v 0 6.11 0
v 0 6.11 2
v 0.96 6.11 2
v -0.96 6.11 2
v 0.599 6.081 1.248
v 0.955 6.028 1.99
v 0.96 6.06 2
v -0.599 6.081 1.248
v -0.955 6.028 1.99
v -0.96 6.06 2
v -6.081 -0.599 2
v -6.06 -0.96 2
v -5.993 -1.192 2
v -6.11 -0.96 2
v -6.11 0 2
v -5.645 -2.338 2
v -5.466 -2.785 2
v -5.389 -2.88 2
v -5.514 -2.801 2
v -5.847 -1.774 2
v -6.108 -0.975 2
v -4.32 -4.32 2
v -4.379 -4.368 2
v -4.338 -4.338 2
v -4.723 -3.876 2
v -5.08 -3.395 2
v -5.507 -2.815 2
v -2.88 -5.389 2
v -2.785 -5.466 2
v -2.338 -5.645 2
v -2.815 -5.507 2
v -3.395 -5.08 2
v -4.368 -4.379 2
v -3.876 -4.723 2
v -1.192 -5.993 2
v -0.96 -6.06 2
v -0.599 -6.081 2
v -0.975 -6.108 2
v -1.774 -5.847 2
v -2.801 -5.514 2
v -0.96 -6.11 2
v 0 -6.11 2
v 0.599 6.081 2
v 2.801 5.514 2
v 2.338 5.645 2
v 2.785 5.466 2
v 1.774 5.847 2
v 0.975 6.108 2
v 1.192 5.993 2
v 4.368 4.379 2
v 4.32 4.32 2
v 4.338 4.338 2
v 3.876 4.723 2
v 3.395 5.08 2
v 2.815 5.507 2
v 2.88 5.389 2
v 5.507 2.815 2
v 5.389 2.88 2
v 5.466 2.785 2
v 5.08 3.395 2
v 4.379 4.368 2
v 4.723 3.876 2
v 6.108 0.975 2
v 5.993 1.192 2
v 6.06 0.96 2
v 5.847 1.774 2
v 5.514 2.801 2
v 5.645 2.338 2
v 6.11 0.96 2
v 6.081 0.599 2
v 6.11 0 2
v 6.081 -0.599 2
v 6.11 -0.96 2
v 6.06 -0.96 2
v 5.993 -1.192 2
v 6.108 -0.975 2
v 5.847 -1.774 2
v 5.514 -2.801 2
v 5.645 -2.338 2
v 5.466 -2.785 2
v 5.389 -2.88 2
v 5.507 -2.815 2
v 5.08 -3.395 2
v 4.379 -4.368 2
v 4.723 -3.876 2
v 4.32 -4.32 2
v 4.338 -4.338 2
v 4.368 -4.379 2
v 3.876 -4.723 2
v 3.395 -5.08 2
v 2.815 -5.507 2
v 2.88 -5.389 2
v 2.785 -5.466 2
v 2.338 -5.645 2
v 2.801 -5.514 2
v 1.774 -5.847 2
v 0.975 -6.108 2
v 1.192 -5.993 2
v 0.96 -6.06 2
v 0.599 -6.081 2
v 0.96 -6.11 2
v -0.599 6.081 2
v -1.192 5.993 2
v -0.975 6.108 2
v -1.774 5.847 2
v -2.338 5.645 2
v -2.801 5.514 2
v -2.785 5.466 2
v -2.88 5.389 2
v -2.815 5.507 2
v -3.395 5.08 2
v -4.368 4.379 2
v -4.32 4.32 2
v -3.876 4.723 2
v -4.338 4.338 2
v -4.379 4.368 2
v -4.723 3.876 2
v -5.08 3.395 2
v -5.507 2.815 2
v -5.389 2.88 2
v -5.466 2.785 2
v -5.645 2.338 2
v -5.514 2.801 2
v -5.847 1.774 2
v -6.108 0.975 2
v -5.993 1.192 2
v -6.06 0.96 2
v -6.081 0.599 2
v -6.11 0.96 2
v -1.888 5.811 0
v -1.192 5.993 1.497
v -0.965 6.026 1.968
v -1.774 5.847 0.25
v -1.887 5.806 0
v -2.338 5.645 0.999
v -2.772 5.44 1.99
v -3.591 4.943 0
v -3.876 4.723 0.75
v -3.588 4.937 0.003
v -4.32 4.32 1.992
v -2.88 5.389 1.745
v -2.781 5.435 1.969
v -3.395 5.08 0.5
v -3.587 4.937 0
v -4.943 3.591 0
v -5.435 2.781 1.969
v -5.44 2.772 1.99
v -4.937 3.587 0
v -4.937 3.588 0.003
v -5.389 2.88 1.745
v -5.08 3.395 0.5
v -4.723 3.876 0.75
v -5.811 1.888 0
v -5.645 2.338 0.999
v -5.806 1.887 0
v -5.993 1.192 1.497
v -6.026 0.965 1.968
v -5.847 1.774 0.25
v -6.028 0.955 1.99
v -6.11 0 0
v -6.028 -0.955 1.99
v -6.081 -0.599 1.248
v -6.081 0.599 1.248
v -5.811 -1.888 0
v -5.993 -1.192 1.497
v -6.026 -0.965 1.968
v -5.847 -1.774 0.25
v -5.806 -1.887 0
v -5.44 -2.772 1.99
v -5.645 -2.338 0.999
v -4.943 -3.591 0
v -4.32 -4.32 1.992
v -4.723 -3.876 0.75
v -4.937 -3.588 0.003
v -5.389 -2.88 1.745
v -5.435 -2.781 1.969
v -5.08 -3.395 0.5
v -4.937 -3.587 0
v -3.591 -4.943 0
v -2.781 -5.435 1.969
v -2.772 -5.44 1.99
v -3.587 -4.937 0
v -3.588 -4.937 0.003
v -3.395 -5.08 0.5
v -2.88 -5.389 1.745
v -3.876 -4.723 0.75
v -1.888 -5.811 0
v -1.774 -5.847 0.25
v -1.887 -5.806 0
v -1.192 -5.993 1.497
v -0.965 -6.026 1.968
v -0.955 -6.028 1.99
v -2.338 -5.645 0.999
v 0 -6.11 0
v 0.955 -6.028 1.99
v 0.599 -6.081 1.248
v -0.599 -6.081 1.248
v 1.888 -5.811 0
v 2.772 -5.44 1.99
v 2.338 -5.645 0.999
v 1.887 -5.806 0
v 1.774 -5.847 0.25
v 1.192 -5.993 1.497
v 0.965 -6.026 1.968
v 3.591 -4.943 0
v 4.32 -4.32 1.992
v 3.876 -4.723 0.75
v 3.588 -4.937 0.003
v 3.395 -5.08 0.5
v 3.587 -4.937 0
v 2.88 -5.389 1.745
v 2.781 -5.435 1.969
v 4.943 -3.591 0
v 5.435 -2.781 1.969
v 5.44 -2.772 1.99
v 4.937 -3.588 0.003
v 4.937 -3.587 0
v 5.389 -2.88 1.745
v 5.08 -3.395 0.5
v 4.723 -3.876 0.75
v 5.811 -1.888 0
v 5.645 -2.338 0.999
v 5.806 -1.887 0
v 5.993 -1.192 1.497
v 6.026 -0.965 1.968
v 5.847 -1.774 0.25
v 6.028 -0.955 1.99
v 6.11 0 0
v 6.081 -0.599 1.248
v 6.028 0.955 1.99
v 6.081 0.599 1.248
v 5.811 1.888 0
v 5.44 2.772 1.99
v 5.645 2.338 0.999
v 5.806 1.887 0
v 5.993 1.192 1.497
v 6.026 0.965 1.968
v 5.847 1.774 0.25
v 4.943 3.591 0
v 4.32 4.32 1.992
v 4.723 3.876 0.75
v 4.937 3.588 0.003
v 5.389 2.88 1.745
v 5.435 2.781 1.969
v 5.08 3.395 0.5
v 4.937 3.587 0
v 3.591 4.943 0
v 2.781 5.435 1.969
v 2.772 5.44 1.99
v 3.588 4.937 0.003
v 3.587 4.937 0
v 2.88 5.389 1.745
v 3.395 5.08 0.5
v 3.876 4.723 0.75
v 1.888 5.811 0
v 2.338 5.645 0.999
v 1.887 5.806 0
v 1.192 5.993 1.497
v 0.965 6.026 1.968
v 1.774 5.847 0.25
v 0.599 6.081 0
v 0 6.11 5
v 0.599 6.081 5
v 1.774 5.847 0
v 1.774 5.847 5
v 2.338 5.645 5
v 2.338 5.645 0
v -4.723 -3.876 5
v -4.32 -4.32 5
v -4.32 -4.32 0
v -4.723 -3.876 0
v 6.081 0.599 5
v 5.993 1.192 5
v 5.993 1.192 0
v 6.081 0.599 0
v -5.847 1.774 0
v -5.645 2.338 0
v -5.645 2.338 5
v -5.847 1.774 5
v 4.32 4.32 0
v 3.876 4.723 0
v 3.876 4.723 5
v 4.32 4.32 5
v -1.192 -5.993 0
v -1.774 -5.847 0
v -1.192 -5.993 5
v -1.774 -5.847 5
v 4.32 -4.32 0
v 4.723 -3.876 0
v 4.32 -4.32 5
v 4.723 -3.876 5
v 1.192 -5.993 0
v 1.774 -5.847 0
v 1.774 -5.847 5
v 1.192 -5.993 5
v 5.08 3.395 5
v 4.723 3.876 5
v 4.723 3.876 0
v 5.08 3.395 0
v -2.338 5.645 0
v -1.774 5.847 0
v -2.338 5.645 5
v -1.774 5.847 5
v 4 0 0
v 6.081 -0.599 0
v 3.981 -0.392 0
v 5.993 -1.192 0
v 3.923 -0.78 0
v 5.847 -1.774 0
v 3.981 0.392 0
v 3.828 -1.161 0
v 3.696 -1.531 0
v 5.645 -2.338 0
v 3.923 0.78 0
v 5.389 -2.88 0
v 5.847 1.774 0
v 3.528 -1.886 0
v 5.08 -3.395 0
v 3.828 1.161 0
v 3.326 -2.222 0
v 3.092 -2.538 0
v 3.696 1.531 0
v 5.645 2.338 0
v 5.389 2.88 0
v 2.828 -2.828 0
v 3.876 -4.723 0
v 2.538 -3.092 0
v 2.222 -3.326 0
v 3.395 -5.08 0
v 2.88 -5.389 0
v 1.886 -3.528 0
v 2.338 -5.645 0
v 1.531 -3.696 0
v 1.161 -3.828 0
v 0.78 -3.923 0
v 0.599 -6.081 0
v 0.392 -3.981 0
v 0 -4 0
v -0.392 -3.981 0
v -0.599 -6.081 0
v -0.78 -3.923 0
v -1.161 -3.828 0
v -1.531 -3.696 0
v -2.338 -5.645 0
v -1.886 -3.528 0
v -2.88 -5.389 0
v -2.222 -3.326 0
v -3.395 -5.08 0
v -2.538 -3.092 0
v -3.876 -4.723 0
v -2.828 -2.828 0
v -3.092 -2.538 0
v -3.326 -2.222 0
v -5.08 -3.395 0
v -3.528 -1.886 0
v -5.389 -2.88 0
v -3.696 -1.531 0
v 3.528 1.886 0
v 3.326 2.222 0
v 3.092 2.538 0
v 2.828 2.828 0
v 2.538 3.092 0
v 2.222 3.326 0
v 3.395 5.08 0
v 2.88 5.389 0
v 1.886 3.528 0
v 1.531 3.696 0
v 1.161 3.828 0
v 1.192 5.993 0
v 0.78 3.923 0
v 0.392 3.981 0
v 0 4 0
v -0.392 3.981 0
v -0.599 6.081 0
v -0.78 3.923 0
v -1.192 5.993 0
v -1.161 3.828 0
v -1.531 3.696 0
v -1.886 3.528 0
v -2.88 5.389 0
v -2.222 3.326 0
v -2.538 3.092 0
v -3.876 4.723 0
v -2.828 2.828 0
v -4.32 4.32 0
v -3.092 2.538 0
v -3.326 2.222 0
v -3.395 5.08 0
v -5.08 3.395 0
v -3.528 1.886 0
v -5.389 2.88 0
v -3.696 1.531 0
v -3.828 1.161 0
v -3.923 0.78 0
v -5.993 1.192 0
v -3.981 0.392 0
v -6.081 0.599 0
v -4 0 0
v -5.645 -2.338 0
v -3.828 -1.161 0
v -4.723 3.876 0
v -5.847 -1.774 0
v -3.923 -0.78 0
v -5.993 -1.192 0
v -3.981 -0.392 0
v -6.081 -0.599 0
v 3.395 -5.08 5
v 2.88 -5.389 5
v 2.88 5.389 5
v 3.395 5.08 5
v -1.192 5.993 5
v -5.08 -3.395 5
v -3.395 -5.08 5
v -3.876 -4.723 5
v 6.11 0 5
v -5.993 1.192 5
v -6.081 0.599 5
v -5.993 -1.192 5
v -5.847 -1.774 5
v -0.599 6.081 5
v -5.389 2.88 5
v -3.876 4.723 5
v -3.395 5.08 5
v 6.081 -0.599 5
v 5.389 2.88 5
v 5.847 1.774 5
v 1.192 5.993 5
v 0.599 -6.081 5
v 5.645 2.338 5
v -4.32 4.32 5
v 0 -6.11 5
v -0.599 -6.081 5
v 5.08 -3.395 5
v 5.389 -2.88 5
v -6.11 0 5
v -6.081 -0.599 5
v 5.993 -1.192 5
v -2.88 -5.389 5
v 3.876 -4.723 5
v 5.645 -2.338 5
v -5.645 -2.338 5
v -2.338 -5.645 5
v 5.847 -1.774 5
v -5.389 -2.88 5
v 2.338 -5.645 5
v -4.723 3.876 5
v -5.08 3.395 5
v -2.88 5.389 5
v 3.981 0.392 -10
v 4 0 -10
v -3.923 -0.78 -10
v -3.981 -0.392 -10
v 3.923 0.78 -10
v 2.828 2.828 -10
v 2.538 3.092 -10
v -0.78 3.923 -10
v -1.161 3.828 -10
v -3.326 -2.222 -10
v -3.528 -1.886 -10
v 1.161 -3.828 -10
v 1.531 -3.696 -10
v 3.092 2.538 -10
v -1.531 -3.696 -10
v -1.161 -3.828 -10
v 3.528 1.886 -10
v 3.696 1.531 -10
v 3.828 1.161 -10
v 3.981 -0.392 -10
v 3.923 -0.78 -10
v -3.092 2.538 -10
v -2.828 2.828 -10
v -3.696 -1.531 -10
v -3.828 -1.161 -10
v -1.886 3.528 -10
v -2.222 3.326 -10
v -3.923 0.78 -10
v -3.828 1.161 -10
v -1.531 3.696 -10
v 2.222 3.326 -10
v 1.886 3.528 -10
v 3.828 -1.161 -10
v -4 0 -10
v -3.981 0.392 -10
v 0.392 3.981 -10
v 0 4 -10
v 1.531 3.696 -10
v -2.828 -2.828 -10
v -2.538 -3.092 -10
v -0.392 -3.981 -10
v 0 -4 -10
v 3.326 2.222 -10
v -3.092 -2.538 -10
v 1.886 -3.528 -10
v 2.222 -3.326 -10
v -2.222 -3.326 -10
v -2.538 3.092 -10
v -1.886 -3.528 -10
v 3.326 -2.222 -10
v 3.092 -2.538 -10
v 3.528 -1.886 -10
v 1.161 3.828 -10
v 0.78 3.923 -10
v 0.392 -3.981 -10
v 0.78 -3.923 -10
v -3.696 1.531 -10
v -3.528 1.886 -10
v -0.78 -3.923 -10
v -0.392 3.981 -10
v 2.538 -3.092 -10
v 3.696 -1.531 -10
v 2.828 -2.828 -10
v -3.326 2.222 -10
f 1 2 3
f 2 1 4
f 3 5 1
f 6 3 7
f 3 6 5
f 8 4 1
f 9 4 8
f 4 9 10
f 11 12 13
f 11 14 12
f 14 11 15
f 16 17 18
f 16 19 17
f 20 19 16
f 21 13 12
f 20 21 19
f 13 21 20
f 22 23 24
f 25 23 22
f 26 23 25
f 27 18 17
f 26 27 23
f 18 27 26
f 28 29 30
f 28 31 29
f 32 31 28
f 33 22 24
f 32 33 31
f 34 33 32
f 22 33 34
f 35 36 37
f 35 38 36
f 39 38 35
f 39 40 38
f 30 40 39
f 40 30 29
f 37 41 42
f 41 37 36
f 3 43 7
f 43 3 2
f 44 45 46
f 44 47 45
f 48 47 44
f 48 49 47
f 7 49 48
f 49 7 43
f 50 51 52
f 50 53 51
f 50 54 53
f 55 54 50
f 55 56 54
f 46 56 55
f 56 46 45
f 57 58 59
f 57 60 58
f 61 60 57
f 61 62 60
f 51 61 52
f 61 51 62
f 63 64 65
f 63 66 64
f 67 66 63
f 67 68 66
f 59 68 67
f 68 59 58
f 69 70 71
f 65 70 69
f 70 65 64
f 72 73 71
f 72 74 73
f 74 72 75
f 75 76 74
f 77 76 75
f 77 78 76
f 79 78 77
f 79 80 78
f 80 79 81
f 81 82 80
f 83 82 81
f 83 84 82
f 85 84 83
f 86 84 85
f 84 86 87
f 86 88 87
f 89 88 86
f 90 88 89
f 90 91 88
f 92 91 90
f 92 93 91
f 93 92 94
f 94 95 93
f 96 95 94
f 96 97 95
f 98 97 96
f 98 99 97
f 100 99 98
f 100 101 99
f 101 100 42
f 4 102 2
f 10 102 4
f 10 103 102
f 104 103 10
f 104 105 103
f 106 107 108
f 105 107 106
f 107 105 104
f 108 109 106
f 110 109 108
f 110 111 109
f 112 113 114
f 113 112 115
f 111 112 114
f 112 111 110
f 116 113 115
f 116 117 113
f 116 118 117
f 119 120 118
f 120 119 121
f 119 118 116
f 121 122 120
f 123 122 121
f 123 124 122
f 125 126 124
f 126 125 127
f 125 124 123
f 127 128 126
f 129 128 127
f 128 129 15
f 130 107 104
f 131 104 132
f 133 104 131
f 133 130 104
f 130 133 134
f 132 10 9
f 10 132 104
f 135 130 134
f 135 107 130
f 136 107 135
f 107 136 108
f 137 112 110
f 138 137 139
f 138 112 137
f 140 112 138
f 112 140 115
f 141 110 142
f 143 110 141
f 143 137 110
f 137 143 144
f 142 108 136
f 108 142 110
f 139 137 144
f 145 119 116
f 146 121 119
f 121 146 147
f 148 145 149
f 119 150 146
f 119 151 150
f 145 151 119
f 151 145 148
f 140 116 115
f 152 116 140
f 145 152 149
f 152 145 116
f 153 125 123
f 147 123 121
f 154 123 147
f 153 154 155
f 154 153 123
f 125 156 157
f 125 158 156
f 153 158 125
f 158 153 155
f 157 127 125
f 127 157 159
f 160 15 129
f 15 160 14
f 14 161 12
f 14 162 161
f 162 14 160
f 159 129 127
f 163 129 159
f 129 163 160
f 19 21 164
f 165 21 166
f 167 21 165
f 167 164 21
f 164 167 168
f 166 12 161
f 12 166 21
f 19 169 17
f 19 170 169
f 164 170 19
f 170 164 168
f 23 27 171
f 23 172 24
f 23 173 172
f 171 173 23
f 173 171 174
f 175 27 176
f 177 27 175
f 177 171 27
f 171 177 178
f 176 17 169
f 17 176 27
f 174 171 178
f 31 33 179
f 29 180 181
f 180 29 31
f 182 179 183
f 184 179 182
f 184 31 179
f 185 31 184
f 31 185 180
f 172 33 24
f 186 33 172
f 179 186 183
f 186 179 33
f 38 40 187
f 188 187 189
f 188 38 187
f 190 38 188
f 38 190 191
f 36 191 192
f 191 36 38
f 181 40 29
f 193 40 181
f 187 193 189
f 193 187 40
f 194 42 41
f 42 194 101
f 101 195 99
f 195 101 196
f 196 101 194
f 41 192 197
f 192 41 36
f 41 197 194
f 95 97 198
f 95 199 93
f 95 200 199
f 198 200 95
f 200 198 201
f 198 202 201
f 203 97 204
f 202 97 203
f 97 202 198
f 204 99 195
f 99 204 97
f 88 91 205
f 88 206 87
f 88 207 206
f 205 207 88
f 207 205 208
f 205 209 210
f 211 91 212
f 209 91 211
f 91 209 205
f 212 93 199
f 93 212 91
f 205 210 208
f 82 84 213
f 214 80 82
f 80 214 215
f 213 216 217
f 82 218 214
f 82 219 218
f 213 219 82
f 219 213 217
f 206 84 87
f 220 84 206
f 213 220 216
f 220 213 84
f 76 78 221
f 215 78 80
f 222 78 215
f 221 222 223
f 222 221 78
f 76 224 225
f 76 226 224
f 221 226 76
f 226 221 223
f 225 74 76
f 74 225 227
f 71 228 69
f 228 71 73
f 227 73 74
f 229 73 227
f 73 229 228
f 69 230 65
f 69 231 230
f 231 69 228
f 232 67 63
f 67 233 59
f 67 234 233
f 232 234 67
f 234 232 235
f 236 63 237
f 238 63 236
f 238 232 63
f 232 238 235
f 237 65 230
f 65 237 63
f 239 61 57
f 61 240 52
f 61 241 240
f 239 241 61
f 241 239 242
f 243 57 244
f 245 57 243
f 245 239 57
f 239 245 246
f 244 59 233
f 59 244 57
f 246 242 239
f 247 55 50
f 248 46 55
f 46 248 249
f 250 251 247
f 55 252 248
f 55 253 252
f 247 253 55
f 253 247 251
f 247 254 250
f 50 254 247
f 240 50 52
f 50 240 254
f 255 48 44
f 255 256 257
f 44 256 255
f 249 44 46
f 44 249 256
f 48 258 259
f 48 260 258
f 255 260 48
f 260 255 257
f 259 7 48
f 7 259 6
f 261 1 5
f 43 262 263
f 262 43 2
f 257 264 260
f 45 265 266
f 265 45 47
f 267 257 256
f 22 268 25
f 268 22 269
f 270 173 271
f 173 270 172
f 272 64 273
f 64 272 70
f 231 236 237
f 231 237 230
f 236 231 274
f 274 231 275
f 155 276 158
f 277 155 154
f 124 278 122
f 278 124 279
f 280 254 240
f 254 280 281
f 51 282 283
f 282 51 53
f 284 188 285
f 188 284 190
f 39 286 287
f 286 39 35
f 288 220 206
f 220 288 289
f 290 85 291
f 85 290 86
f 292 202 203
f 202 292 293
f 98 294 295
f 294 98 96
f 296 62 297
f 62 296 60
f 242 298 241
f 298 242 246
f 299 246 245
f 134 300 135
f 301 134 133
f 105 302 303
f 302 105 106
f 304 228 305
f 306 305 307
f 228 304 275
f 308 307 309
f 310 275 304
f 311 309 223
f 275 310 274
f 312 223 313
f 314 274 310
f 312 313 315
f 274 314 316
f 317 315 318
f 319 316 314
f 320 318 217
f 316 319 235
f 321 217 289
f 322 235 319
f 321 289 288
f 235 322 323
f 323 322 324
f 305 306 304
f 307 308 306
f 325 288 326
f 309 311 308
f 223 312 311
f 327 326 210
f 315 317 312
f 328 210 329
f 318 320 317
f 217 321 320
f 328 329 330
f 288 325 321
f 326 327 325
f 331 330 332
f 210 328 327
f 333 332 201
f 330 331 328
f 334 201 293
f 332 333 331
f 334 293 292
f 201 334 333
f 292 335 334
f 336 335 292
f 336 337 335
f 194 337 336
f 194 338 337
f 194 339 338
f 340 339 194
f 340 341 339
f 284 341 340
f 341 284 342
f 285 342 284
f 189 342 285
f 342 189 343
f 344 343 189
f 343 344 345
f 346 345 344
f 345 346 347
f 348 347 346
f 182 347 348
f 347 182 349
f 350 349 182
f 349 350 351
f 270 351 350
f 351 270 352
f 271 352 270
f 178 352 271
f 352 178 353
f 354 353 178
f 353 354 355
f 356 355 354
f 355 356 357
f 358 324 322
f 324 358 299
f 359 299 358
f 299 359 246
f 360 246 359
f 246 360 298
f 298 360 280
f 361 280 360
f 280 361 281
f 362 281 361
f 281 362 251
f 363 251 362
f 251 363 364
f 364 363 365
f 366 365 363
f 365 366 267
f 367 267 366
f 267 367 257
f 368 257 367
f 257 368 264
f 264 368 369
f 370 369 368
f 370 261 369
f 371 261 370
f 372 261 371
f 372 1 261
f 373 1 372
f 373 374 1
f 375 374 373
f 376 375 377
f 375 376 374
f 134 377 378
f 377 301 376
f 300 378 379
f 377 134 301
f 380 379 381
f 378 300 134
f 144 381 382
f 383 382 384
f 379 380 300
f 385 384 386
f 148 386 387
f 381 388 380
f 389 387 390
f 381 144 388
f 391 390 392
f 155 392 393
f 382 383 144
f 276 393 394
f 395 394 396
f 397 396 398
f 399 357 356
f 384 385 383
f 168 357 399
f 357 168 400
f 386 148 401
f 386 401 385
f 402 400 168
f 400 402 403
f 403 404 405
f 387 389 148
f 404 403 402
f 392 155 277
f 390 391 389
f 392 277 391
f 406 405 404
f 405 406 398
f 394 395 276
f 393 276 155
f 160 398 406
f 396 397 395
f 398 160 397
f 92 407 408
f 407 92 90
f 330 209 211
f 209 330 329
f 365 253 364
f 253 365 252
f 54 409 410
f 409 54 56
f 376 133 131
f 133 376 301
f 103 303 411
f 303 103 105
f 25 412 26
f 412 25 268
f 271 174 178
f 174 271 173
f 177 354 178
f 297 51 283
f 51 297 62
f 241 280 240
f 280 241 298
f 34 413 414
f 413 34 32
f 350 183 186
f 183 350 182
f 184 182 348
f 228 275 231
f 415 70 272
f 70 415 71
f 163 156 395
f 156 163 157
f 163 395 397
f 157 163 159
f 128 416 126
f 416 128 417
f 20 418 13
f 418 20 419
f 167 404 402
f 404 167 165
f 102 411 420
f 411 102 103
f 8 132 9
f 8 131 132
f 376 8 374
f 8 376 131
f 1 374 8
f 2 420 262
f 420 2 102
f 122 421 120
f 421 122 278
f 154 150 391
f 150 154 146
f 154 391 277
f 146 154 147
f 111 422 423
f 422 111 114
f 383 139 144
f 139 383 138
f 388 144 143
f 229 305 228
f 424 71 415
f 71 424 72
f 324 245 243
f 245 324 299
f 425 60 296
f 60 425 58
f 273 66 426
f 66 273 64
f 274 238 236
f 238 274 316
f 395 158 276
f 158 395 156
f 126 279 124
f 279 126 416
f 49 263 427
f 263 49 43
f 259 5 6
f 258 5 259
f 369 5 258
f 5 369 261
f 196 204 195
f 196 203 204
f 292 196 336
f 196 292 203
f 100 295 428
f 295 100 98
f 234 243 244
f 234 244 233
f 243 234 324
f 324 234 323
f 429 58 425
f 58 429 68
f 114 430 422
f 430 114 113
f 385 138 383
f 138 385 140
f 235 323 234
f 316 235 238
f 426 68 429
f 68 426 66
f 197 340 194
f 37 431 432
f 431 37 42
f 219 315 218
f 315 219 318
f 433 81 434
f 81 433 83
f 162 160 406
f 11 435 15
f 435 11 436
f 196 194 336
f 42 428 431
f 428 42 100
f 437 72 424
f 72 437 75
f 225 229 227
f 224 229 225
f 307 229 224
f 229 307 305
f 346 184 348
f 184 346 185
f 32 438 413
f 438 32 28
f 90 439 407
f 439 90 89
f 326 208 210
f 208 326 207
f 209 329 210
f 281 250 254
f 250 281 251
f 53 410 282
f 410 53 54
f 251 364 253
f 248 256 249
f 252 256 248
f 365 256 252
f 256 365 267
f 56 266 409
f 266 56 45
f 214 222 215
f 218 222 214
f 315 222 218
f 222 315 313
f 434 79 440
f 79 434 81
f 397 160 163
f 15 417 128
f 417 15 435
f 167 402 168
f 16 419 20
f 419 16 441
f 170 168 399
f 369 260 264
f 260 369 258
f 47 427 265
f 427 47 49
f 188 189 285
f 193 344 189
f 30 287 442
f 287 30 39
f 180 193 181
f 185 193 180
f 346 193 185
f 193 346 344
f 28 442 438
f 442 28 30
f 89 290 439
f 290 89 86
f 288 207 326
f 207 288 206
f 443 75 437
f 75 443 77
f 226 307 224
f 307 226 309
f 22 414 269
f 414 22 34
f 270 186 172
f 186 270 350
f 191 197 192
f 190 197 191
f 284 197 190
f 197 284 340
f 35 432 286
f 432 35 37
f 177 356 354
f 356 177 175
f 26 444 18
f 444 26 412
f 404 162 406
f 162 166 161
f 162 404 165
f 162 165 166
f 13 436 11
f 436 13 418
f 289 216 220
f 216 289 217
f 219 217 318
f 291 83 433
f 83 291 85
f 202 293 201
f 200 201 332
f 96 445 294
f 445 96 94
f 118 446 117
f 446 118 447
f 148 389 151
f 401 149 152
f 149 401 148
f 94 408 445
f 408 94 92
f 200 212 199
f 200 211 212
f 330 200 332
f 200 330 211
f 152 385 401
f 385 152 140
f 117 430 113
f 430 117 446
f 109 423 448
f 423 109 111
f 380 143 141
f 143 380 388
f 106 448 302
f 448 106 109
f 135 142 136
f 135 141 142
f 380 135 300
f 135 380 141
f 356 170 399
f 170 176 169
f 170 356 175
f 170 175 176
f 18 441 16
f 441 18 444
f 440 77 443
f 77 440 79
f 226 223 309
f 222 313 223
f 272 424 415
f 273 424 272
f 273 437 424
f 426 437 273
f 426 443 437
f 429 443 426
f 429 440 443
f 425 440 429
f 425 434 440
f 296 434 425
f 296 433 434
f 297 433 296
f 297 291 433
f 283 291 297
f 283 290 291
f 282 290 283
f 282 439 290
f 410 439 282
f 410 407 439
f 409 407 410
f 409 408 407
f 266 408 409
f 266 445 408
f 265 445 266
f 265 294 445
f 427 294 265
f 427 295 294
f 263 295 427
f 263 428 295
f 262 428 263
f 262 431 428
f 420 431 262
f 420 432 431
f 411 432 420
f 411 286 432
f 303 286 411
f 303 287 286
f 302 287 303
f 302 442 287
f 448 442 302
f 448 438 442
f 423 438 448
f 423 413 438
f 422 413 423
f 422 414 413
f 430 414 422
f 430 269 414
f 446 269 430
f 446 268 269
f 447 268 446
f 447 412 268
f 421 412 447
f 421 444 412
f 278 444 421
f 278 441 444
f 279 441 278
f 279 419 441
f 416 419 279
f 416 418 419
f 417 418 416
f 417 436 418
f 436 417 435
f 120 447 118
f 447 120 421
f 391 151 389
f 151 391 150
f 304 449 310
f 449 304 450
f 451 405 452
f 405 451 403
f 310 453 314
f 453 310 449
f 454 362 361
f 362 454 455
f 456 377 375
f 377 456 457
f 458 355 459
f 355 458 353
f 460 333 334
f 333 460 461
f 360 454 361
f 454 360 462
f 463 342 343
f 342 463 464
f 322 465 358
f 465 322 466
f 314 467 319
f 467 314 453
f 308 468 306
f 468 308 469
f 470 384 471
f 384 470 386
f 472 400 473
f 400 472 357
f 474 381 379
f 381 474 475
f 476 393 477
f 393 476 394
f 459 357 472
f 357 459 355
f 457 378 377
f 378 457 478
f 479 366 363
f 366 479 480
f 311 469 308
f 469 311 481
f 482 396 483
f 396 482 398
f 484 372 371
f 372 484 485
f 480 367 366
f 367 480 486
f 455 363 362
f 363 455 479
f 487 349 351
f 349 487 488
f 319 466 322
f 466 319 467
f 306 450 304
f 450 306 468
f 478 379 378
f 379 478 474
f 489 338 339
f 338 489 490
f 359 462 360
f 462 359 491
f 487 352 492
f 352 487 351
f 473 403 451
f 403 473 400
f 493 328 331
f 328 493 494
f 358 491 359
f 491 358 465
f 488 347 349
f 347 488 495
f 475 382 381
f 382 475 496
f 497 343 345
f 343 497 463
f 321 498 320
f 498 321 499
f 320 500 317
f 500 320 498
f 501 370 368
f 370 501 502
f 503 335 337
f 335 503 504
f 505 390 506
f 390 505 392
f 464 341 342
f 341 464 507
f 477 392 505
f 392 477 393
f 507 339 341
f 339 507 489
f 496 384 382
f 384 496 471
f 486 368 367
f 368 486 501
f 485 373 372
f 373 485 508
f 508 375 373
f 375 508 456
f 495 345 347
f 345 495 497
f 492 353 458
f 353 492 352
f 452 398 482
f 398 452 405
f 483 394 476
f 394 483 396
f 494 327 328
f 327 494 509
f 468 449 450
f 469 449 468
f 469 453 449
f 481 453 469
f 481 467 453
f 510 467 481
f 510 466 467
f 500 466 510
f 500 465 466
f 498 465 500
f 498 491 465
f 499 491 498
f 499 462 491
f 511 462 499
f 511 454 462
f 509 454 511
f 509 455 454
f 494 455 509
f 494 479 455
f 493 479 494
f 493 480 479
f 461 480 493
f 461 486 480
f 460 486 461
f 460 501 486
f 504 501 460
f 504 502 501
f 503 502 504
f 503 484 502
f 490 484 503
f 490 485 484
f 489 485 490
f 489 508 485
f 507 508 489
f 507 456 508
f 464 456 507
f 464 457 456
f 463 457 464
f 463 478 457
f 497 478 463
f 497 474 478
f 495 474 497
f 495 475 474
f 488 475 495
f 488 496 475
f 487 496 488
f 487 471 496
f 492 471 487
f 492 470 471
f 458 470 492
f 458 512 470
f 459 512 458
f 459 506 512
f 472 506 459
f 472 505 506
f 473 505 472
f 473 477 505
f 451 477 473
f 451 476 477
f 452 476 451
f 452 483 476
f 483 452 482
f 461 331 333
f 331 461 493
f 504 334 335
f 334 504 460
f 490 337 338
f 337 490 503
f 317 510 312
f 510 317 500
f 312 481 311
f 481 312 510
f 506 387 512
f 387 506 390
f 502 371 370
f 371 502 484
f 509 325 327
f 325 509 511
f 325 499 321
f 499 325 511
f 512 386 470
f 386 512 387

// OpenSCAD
module timing_pulley(teeth=20, pitch_diameter=12.22, belt_width=5, hub_diameter=8, hub_height=10) {
    tooth_height = 2;
    tooth_width = pitch_diameter * PI / teeth;
    pulley_radius = pitch_diameter / 2;
    
    module tooth() {
        translate([0, pulley_radius, 0])
        rotate([90, 0, 0])
        linear_extrude(height=belt_width)
        polygon(points=[[0, 0], [tooth_width / 2, tooth_height], [-tooth_width / 2, tooth_height]]);
    }
    
    union() {
        // Create the main pulley body
        cylinder(h=belt_width, r=pulley_radius, $fn=64);
        
        // Add teeth around the pulley
        for (i = [0:teeth-1]) {
            rotate([0, 0, i * 360 / teeth])
            tooth();
        }
        
        // Add the hub
        translate([0, 0, -hub_height])
        cylinder(h=hub_height, r=hub_diameter / 2, $fn=64);
    }
}

timing_pulley();
